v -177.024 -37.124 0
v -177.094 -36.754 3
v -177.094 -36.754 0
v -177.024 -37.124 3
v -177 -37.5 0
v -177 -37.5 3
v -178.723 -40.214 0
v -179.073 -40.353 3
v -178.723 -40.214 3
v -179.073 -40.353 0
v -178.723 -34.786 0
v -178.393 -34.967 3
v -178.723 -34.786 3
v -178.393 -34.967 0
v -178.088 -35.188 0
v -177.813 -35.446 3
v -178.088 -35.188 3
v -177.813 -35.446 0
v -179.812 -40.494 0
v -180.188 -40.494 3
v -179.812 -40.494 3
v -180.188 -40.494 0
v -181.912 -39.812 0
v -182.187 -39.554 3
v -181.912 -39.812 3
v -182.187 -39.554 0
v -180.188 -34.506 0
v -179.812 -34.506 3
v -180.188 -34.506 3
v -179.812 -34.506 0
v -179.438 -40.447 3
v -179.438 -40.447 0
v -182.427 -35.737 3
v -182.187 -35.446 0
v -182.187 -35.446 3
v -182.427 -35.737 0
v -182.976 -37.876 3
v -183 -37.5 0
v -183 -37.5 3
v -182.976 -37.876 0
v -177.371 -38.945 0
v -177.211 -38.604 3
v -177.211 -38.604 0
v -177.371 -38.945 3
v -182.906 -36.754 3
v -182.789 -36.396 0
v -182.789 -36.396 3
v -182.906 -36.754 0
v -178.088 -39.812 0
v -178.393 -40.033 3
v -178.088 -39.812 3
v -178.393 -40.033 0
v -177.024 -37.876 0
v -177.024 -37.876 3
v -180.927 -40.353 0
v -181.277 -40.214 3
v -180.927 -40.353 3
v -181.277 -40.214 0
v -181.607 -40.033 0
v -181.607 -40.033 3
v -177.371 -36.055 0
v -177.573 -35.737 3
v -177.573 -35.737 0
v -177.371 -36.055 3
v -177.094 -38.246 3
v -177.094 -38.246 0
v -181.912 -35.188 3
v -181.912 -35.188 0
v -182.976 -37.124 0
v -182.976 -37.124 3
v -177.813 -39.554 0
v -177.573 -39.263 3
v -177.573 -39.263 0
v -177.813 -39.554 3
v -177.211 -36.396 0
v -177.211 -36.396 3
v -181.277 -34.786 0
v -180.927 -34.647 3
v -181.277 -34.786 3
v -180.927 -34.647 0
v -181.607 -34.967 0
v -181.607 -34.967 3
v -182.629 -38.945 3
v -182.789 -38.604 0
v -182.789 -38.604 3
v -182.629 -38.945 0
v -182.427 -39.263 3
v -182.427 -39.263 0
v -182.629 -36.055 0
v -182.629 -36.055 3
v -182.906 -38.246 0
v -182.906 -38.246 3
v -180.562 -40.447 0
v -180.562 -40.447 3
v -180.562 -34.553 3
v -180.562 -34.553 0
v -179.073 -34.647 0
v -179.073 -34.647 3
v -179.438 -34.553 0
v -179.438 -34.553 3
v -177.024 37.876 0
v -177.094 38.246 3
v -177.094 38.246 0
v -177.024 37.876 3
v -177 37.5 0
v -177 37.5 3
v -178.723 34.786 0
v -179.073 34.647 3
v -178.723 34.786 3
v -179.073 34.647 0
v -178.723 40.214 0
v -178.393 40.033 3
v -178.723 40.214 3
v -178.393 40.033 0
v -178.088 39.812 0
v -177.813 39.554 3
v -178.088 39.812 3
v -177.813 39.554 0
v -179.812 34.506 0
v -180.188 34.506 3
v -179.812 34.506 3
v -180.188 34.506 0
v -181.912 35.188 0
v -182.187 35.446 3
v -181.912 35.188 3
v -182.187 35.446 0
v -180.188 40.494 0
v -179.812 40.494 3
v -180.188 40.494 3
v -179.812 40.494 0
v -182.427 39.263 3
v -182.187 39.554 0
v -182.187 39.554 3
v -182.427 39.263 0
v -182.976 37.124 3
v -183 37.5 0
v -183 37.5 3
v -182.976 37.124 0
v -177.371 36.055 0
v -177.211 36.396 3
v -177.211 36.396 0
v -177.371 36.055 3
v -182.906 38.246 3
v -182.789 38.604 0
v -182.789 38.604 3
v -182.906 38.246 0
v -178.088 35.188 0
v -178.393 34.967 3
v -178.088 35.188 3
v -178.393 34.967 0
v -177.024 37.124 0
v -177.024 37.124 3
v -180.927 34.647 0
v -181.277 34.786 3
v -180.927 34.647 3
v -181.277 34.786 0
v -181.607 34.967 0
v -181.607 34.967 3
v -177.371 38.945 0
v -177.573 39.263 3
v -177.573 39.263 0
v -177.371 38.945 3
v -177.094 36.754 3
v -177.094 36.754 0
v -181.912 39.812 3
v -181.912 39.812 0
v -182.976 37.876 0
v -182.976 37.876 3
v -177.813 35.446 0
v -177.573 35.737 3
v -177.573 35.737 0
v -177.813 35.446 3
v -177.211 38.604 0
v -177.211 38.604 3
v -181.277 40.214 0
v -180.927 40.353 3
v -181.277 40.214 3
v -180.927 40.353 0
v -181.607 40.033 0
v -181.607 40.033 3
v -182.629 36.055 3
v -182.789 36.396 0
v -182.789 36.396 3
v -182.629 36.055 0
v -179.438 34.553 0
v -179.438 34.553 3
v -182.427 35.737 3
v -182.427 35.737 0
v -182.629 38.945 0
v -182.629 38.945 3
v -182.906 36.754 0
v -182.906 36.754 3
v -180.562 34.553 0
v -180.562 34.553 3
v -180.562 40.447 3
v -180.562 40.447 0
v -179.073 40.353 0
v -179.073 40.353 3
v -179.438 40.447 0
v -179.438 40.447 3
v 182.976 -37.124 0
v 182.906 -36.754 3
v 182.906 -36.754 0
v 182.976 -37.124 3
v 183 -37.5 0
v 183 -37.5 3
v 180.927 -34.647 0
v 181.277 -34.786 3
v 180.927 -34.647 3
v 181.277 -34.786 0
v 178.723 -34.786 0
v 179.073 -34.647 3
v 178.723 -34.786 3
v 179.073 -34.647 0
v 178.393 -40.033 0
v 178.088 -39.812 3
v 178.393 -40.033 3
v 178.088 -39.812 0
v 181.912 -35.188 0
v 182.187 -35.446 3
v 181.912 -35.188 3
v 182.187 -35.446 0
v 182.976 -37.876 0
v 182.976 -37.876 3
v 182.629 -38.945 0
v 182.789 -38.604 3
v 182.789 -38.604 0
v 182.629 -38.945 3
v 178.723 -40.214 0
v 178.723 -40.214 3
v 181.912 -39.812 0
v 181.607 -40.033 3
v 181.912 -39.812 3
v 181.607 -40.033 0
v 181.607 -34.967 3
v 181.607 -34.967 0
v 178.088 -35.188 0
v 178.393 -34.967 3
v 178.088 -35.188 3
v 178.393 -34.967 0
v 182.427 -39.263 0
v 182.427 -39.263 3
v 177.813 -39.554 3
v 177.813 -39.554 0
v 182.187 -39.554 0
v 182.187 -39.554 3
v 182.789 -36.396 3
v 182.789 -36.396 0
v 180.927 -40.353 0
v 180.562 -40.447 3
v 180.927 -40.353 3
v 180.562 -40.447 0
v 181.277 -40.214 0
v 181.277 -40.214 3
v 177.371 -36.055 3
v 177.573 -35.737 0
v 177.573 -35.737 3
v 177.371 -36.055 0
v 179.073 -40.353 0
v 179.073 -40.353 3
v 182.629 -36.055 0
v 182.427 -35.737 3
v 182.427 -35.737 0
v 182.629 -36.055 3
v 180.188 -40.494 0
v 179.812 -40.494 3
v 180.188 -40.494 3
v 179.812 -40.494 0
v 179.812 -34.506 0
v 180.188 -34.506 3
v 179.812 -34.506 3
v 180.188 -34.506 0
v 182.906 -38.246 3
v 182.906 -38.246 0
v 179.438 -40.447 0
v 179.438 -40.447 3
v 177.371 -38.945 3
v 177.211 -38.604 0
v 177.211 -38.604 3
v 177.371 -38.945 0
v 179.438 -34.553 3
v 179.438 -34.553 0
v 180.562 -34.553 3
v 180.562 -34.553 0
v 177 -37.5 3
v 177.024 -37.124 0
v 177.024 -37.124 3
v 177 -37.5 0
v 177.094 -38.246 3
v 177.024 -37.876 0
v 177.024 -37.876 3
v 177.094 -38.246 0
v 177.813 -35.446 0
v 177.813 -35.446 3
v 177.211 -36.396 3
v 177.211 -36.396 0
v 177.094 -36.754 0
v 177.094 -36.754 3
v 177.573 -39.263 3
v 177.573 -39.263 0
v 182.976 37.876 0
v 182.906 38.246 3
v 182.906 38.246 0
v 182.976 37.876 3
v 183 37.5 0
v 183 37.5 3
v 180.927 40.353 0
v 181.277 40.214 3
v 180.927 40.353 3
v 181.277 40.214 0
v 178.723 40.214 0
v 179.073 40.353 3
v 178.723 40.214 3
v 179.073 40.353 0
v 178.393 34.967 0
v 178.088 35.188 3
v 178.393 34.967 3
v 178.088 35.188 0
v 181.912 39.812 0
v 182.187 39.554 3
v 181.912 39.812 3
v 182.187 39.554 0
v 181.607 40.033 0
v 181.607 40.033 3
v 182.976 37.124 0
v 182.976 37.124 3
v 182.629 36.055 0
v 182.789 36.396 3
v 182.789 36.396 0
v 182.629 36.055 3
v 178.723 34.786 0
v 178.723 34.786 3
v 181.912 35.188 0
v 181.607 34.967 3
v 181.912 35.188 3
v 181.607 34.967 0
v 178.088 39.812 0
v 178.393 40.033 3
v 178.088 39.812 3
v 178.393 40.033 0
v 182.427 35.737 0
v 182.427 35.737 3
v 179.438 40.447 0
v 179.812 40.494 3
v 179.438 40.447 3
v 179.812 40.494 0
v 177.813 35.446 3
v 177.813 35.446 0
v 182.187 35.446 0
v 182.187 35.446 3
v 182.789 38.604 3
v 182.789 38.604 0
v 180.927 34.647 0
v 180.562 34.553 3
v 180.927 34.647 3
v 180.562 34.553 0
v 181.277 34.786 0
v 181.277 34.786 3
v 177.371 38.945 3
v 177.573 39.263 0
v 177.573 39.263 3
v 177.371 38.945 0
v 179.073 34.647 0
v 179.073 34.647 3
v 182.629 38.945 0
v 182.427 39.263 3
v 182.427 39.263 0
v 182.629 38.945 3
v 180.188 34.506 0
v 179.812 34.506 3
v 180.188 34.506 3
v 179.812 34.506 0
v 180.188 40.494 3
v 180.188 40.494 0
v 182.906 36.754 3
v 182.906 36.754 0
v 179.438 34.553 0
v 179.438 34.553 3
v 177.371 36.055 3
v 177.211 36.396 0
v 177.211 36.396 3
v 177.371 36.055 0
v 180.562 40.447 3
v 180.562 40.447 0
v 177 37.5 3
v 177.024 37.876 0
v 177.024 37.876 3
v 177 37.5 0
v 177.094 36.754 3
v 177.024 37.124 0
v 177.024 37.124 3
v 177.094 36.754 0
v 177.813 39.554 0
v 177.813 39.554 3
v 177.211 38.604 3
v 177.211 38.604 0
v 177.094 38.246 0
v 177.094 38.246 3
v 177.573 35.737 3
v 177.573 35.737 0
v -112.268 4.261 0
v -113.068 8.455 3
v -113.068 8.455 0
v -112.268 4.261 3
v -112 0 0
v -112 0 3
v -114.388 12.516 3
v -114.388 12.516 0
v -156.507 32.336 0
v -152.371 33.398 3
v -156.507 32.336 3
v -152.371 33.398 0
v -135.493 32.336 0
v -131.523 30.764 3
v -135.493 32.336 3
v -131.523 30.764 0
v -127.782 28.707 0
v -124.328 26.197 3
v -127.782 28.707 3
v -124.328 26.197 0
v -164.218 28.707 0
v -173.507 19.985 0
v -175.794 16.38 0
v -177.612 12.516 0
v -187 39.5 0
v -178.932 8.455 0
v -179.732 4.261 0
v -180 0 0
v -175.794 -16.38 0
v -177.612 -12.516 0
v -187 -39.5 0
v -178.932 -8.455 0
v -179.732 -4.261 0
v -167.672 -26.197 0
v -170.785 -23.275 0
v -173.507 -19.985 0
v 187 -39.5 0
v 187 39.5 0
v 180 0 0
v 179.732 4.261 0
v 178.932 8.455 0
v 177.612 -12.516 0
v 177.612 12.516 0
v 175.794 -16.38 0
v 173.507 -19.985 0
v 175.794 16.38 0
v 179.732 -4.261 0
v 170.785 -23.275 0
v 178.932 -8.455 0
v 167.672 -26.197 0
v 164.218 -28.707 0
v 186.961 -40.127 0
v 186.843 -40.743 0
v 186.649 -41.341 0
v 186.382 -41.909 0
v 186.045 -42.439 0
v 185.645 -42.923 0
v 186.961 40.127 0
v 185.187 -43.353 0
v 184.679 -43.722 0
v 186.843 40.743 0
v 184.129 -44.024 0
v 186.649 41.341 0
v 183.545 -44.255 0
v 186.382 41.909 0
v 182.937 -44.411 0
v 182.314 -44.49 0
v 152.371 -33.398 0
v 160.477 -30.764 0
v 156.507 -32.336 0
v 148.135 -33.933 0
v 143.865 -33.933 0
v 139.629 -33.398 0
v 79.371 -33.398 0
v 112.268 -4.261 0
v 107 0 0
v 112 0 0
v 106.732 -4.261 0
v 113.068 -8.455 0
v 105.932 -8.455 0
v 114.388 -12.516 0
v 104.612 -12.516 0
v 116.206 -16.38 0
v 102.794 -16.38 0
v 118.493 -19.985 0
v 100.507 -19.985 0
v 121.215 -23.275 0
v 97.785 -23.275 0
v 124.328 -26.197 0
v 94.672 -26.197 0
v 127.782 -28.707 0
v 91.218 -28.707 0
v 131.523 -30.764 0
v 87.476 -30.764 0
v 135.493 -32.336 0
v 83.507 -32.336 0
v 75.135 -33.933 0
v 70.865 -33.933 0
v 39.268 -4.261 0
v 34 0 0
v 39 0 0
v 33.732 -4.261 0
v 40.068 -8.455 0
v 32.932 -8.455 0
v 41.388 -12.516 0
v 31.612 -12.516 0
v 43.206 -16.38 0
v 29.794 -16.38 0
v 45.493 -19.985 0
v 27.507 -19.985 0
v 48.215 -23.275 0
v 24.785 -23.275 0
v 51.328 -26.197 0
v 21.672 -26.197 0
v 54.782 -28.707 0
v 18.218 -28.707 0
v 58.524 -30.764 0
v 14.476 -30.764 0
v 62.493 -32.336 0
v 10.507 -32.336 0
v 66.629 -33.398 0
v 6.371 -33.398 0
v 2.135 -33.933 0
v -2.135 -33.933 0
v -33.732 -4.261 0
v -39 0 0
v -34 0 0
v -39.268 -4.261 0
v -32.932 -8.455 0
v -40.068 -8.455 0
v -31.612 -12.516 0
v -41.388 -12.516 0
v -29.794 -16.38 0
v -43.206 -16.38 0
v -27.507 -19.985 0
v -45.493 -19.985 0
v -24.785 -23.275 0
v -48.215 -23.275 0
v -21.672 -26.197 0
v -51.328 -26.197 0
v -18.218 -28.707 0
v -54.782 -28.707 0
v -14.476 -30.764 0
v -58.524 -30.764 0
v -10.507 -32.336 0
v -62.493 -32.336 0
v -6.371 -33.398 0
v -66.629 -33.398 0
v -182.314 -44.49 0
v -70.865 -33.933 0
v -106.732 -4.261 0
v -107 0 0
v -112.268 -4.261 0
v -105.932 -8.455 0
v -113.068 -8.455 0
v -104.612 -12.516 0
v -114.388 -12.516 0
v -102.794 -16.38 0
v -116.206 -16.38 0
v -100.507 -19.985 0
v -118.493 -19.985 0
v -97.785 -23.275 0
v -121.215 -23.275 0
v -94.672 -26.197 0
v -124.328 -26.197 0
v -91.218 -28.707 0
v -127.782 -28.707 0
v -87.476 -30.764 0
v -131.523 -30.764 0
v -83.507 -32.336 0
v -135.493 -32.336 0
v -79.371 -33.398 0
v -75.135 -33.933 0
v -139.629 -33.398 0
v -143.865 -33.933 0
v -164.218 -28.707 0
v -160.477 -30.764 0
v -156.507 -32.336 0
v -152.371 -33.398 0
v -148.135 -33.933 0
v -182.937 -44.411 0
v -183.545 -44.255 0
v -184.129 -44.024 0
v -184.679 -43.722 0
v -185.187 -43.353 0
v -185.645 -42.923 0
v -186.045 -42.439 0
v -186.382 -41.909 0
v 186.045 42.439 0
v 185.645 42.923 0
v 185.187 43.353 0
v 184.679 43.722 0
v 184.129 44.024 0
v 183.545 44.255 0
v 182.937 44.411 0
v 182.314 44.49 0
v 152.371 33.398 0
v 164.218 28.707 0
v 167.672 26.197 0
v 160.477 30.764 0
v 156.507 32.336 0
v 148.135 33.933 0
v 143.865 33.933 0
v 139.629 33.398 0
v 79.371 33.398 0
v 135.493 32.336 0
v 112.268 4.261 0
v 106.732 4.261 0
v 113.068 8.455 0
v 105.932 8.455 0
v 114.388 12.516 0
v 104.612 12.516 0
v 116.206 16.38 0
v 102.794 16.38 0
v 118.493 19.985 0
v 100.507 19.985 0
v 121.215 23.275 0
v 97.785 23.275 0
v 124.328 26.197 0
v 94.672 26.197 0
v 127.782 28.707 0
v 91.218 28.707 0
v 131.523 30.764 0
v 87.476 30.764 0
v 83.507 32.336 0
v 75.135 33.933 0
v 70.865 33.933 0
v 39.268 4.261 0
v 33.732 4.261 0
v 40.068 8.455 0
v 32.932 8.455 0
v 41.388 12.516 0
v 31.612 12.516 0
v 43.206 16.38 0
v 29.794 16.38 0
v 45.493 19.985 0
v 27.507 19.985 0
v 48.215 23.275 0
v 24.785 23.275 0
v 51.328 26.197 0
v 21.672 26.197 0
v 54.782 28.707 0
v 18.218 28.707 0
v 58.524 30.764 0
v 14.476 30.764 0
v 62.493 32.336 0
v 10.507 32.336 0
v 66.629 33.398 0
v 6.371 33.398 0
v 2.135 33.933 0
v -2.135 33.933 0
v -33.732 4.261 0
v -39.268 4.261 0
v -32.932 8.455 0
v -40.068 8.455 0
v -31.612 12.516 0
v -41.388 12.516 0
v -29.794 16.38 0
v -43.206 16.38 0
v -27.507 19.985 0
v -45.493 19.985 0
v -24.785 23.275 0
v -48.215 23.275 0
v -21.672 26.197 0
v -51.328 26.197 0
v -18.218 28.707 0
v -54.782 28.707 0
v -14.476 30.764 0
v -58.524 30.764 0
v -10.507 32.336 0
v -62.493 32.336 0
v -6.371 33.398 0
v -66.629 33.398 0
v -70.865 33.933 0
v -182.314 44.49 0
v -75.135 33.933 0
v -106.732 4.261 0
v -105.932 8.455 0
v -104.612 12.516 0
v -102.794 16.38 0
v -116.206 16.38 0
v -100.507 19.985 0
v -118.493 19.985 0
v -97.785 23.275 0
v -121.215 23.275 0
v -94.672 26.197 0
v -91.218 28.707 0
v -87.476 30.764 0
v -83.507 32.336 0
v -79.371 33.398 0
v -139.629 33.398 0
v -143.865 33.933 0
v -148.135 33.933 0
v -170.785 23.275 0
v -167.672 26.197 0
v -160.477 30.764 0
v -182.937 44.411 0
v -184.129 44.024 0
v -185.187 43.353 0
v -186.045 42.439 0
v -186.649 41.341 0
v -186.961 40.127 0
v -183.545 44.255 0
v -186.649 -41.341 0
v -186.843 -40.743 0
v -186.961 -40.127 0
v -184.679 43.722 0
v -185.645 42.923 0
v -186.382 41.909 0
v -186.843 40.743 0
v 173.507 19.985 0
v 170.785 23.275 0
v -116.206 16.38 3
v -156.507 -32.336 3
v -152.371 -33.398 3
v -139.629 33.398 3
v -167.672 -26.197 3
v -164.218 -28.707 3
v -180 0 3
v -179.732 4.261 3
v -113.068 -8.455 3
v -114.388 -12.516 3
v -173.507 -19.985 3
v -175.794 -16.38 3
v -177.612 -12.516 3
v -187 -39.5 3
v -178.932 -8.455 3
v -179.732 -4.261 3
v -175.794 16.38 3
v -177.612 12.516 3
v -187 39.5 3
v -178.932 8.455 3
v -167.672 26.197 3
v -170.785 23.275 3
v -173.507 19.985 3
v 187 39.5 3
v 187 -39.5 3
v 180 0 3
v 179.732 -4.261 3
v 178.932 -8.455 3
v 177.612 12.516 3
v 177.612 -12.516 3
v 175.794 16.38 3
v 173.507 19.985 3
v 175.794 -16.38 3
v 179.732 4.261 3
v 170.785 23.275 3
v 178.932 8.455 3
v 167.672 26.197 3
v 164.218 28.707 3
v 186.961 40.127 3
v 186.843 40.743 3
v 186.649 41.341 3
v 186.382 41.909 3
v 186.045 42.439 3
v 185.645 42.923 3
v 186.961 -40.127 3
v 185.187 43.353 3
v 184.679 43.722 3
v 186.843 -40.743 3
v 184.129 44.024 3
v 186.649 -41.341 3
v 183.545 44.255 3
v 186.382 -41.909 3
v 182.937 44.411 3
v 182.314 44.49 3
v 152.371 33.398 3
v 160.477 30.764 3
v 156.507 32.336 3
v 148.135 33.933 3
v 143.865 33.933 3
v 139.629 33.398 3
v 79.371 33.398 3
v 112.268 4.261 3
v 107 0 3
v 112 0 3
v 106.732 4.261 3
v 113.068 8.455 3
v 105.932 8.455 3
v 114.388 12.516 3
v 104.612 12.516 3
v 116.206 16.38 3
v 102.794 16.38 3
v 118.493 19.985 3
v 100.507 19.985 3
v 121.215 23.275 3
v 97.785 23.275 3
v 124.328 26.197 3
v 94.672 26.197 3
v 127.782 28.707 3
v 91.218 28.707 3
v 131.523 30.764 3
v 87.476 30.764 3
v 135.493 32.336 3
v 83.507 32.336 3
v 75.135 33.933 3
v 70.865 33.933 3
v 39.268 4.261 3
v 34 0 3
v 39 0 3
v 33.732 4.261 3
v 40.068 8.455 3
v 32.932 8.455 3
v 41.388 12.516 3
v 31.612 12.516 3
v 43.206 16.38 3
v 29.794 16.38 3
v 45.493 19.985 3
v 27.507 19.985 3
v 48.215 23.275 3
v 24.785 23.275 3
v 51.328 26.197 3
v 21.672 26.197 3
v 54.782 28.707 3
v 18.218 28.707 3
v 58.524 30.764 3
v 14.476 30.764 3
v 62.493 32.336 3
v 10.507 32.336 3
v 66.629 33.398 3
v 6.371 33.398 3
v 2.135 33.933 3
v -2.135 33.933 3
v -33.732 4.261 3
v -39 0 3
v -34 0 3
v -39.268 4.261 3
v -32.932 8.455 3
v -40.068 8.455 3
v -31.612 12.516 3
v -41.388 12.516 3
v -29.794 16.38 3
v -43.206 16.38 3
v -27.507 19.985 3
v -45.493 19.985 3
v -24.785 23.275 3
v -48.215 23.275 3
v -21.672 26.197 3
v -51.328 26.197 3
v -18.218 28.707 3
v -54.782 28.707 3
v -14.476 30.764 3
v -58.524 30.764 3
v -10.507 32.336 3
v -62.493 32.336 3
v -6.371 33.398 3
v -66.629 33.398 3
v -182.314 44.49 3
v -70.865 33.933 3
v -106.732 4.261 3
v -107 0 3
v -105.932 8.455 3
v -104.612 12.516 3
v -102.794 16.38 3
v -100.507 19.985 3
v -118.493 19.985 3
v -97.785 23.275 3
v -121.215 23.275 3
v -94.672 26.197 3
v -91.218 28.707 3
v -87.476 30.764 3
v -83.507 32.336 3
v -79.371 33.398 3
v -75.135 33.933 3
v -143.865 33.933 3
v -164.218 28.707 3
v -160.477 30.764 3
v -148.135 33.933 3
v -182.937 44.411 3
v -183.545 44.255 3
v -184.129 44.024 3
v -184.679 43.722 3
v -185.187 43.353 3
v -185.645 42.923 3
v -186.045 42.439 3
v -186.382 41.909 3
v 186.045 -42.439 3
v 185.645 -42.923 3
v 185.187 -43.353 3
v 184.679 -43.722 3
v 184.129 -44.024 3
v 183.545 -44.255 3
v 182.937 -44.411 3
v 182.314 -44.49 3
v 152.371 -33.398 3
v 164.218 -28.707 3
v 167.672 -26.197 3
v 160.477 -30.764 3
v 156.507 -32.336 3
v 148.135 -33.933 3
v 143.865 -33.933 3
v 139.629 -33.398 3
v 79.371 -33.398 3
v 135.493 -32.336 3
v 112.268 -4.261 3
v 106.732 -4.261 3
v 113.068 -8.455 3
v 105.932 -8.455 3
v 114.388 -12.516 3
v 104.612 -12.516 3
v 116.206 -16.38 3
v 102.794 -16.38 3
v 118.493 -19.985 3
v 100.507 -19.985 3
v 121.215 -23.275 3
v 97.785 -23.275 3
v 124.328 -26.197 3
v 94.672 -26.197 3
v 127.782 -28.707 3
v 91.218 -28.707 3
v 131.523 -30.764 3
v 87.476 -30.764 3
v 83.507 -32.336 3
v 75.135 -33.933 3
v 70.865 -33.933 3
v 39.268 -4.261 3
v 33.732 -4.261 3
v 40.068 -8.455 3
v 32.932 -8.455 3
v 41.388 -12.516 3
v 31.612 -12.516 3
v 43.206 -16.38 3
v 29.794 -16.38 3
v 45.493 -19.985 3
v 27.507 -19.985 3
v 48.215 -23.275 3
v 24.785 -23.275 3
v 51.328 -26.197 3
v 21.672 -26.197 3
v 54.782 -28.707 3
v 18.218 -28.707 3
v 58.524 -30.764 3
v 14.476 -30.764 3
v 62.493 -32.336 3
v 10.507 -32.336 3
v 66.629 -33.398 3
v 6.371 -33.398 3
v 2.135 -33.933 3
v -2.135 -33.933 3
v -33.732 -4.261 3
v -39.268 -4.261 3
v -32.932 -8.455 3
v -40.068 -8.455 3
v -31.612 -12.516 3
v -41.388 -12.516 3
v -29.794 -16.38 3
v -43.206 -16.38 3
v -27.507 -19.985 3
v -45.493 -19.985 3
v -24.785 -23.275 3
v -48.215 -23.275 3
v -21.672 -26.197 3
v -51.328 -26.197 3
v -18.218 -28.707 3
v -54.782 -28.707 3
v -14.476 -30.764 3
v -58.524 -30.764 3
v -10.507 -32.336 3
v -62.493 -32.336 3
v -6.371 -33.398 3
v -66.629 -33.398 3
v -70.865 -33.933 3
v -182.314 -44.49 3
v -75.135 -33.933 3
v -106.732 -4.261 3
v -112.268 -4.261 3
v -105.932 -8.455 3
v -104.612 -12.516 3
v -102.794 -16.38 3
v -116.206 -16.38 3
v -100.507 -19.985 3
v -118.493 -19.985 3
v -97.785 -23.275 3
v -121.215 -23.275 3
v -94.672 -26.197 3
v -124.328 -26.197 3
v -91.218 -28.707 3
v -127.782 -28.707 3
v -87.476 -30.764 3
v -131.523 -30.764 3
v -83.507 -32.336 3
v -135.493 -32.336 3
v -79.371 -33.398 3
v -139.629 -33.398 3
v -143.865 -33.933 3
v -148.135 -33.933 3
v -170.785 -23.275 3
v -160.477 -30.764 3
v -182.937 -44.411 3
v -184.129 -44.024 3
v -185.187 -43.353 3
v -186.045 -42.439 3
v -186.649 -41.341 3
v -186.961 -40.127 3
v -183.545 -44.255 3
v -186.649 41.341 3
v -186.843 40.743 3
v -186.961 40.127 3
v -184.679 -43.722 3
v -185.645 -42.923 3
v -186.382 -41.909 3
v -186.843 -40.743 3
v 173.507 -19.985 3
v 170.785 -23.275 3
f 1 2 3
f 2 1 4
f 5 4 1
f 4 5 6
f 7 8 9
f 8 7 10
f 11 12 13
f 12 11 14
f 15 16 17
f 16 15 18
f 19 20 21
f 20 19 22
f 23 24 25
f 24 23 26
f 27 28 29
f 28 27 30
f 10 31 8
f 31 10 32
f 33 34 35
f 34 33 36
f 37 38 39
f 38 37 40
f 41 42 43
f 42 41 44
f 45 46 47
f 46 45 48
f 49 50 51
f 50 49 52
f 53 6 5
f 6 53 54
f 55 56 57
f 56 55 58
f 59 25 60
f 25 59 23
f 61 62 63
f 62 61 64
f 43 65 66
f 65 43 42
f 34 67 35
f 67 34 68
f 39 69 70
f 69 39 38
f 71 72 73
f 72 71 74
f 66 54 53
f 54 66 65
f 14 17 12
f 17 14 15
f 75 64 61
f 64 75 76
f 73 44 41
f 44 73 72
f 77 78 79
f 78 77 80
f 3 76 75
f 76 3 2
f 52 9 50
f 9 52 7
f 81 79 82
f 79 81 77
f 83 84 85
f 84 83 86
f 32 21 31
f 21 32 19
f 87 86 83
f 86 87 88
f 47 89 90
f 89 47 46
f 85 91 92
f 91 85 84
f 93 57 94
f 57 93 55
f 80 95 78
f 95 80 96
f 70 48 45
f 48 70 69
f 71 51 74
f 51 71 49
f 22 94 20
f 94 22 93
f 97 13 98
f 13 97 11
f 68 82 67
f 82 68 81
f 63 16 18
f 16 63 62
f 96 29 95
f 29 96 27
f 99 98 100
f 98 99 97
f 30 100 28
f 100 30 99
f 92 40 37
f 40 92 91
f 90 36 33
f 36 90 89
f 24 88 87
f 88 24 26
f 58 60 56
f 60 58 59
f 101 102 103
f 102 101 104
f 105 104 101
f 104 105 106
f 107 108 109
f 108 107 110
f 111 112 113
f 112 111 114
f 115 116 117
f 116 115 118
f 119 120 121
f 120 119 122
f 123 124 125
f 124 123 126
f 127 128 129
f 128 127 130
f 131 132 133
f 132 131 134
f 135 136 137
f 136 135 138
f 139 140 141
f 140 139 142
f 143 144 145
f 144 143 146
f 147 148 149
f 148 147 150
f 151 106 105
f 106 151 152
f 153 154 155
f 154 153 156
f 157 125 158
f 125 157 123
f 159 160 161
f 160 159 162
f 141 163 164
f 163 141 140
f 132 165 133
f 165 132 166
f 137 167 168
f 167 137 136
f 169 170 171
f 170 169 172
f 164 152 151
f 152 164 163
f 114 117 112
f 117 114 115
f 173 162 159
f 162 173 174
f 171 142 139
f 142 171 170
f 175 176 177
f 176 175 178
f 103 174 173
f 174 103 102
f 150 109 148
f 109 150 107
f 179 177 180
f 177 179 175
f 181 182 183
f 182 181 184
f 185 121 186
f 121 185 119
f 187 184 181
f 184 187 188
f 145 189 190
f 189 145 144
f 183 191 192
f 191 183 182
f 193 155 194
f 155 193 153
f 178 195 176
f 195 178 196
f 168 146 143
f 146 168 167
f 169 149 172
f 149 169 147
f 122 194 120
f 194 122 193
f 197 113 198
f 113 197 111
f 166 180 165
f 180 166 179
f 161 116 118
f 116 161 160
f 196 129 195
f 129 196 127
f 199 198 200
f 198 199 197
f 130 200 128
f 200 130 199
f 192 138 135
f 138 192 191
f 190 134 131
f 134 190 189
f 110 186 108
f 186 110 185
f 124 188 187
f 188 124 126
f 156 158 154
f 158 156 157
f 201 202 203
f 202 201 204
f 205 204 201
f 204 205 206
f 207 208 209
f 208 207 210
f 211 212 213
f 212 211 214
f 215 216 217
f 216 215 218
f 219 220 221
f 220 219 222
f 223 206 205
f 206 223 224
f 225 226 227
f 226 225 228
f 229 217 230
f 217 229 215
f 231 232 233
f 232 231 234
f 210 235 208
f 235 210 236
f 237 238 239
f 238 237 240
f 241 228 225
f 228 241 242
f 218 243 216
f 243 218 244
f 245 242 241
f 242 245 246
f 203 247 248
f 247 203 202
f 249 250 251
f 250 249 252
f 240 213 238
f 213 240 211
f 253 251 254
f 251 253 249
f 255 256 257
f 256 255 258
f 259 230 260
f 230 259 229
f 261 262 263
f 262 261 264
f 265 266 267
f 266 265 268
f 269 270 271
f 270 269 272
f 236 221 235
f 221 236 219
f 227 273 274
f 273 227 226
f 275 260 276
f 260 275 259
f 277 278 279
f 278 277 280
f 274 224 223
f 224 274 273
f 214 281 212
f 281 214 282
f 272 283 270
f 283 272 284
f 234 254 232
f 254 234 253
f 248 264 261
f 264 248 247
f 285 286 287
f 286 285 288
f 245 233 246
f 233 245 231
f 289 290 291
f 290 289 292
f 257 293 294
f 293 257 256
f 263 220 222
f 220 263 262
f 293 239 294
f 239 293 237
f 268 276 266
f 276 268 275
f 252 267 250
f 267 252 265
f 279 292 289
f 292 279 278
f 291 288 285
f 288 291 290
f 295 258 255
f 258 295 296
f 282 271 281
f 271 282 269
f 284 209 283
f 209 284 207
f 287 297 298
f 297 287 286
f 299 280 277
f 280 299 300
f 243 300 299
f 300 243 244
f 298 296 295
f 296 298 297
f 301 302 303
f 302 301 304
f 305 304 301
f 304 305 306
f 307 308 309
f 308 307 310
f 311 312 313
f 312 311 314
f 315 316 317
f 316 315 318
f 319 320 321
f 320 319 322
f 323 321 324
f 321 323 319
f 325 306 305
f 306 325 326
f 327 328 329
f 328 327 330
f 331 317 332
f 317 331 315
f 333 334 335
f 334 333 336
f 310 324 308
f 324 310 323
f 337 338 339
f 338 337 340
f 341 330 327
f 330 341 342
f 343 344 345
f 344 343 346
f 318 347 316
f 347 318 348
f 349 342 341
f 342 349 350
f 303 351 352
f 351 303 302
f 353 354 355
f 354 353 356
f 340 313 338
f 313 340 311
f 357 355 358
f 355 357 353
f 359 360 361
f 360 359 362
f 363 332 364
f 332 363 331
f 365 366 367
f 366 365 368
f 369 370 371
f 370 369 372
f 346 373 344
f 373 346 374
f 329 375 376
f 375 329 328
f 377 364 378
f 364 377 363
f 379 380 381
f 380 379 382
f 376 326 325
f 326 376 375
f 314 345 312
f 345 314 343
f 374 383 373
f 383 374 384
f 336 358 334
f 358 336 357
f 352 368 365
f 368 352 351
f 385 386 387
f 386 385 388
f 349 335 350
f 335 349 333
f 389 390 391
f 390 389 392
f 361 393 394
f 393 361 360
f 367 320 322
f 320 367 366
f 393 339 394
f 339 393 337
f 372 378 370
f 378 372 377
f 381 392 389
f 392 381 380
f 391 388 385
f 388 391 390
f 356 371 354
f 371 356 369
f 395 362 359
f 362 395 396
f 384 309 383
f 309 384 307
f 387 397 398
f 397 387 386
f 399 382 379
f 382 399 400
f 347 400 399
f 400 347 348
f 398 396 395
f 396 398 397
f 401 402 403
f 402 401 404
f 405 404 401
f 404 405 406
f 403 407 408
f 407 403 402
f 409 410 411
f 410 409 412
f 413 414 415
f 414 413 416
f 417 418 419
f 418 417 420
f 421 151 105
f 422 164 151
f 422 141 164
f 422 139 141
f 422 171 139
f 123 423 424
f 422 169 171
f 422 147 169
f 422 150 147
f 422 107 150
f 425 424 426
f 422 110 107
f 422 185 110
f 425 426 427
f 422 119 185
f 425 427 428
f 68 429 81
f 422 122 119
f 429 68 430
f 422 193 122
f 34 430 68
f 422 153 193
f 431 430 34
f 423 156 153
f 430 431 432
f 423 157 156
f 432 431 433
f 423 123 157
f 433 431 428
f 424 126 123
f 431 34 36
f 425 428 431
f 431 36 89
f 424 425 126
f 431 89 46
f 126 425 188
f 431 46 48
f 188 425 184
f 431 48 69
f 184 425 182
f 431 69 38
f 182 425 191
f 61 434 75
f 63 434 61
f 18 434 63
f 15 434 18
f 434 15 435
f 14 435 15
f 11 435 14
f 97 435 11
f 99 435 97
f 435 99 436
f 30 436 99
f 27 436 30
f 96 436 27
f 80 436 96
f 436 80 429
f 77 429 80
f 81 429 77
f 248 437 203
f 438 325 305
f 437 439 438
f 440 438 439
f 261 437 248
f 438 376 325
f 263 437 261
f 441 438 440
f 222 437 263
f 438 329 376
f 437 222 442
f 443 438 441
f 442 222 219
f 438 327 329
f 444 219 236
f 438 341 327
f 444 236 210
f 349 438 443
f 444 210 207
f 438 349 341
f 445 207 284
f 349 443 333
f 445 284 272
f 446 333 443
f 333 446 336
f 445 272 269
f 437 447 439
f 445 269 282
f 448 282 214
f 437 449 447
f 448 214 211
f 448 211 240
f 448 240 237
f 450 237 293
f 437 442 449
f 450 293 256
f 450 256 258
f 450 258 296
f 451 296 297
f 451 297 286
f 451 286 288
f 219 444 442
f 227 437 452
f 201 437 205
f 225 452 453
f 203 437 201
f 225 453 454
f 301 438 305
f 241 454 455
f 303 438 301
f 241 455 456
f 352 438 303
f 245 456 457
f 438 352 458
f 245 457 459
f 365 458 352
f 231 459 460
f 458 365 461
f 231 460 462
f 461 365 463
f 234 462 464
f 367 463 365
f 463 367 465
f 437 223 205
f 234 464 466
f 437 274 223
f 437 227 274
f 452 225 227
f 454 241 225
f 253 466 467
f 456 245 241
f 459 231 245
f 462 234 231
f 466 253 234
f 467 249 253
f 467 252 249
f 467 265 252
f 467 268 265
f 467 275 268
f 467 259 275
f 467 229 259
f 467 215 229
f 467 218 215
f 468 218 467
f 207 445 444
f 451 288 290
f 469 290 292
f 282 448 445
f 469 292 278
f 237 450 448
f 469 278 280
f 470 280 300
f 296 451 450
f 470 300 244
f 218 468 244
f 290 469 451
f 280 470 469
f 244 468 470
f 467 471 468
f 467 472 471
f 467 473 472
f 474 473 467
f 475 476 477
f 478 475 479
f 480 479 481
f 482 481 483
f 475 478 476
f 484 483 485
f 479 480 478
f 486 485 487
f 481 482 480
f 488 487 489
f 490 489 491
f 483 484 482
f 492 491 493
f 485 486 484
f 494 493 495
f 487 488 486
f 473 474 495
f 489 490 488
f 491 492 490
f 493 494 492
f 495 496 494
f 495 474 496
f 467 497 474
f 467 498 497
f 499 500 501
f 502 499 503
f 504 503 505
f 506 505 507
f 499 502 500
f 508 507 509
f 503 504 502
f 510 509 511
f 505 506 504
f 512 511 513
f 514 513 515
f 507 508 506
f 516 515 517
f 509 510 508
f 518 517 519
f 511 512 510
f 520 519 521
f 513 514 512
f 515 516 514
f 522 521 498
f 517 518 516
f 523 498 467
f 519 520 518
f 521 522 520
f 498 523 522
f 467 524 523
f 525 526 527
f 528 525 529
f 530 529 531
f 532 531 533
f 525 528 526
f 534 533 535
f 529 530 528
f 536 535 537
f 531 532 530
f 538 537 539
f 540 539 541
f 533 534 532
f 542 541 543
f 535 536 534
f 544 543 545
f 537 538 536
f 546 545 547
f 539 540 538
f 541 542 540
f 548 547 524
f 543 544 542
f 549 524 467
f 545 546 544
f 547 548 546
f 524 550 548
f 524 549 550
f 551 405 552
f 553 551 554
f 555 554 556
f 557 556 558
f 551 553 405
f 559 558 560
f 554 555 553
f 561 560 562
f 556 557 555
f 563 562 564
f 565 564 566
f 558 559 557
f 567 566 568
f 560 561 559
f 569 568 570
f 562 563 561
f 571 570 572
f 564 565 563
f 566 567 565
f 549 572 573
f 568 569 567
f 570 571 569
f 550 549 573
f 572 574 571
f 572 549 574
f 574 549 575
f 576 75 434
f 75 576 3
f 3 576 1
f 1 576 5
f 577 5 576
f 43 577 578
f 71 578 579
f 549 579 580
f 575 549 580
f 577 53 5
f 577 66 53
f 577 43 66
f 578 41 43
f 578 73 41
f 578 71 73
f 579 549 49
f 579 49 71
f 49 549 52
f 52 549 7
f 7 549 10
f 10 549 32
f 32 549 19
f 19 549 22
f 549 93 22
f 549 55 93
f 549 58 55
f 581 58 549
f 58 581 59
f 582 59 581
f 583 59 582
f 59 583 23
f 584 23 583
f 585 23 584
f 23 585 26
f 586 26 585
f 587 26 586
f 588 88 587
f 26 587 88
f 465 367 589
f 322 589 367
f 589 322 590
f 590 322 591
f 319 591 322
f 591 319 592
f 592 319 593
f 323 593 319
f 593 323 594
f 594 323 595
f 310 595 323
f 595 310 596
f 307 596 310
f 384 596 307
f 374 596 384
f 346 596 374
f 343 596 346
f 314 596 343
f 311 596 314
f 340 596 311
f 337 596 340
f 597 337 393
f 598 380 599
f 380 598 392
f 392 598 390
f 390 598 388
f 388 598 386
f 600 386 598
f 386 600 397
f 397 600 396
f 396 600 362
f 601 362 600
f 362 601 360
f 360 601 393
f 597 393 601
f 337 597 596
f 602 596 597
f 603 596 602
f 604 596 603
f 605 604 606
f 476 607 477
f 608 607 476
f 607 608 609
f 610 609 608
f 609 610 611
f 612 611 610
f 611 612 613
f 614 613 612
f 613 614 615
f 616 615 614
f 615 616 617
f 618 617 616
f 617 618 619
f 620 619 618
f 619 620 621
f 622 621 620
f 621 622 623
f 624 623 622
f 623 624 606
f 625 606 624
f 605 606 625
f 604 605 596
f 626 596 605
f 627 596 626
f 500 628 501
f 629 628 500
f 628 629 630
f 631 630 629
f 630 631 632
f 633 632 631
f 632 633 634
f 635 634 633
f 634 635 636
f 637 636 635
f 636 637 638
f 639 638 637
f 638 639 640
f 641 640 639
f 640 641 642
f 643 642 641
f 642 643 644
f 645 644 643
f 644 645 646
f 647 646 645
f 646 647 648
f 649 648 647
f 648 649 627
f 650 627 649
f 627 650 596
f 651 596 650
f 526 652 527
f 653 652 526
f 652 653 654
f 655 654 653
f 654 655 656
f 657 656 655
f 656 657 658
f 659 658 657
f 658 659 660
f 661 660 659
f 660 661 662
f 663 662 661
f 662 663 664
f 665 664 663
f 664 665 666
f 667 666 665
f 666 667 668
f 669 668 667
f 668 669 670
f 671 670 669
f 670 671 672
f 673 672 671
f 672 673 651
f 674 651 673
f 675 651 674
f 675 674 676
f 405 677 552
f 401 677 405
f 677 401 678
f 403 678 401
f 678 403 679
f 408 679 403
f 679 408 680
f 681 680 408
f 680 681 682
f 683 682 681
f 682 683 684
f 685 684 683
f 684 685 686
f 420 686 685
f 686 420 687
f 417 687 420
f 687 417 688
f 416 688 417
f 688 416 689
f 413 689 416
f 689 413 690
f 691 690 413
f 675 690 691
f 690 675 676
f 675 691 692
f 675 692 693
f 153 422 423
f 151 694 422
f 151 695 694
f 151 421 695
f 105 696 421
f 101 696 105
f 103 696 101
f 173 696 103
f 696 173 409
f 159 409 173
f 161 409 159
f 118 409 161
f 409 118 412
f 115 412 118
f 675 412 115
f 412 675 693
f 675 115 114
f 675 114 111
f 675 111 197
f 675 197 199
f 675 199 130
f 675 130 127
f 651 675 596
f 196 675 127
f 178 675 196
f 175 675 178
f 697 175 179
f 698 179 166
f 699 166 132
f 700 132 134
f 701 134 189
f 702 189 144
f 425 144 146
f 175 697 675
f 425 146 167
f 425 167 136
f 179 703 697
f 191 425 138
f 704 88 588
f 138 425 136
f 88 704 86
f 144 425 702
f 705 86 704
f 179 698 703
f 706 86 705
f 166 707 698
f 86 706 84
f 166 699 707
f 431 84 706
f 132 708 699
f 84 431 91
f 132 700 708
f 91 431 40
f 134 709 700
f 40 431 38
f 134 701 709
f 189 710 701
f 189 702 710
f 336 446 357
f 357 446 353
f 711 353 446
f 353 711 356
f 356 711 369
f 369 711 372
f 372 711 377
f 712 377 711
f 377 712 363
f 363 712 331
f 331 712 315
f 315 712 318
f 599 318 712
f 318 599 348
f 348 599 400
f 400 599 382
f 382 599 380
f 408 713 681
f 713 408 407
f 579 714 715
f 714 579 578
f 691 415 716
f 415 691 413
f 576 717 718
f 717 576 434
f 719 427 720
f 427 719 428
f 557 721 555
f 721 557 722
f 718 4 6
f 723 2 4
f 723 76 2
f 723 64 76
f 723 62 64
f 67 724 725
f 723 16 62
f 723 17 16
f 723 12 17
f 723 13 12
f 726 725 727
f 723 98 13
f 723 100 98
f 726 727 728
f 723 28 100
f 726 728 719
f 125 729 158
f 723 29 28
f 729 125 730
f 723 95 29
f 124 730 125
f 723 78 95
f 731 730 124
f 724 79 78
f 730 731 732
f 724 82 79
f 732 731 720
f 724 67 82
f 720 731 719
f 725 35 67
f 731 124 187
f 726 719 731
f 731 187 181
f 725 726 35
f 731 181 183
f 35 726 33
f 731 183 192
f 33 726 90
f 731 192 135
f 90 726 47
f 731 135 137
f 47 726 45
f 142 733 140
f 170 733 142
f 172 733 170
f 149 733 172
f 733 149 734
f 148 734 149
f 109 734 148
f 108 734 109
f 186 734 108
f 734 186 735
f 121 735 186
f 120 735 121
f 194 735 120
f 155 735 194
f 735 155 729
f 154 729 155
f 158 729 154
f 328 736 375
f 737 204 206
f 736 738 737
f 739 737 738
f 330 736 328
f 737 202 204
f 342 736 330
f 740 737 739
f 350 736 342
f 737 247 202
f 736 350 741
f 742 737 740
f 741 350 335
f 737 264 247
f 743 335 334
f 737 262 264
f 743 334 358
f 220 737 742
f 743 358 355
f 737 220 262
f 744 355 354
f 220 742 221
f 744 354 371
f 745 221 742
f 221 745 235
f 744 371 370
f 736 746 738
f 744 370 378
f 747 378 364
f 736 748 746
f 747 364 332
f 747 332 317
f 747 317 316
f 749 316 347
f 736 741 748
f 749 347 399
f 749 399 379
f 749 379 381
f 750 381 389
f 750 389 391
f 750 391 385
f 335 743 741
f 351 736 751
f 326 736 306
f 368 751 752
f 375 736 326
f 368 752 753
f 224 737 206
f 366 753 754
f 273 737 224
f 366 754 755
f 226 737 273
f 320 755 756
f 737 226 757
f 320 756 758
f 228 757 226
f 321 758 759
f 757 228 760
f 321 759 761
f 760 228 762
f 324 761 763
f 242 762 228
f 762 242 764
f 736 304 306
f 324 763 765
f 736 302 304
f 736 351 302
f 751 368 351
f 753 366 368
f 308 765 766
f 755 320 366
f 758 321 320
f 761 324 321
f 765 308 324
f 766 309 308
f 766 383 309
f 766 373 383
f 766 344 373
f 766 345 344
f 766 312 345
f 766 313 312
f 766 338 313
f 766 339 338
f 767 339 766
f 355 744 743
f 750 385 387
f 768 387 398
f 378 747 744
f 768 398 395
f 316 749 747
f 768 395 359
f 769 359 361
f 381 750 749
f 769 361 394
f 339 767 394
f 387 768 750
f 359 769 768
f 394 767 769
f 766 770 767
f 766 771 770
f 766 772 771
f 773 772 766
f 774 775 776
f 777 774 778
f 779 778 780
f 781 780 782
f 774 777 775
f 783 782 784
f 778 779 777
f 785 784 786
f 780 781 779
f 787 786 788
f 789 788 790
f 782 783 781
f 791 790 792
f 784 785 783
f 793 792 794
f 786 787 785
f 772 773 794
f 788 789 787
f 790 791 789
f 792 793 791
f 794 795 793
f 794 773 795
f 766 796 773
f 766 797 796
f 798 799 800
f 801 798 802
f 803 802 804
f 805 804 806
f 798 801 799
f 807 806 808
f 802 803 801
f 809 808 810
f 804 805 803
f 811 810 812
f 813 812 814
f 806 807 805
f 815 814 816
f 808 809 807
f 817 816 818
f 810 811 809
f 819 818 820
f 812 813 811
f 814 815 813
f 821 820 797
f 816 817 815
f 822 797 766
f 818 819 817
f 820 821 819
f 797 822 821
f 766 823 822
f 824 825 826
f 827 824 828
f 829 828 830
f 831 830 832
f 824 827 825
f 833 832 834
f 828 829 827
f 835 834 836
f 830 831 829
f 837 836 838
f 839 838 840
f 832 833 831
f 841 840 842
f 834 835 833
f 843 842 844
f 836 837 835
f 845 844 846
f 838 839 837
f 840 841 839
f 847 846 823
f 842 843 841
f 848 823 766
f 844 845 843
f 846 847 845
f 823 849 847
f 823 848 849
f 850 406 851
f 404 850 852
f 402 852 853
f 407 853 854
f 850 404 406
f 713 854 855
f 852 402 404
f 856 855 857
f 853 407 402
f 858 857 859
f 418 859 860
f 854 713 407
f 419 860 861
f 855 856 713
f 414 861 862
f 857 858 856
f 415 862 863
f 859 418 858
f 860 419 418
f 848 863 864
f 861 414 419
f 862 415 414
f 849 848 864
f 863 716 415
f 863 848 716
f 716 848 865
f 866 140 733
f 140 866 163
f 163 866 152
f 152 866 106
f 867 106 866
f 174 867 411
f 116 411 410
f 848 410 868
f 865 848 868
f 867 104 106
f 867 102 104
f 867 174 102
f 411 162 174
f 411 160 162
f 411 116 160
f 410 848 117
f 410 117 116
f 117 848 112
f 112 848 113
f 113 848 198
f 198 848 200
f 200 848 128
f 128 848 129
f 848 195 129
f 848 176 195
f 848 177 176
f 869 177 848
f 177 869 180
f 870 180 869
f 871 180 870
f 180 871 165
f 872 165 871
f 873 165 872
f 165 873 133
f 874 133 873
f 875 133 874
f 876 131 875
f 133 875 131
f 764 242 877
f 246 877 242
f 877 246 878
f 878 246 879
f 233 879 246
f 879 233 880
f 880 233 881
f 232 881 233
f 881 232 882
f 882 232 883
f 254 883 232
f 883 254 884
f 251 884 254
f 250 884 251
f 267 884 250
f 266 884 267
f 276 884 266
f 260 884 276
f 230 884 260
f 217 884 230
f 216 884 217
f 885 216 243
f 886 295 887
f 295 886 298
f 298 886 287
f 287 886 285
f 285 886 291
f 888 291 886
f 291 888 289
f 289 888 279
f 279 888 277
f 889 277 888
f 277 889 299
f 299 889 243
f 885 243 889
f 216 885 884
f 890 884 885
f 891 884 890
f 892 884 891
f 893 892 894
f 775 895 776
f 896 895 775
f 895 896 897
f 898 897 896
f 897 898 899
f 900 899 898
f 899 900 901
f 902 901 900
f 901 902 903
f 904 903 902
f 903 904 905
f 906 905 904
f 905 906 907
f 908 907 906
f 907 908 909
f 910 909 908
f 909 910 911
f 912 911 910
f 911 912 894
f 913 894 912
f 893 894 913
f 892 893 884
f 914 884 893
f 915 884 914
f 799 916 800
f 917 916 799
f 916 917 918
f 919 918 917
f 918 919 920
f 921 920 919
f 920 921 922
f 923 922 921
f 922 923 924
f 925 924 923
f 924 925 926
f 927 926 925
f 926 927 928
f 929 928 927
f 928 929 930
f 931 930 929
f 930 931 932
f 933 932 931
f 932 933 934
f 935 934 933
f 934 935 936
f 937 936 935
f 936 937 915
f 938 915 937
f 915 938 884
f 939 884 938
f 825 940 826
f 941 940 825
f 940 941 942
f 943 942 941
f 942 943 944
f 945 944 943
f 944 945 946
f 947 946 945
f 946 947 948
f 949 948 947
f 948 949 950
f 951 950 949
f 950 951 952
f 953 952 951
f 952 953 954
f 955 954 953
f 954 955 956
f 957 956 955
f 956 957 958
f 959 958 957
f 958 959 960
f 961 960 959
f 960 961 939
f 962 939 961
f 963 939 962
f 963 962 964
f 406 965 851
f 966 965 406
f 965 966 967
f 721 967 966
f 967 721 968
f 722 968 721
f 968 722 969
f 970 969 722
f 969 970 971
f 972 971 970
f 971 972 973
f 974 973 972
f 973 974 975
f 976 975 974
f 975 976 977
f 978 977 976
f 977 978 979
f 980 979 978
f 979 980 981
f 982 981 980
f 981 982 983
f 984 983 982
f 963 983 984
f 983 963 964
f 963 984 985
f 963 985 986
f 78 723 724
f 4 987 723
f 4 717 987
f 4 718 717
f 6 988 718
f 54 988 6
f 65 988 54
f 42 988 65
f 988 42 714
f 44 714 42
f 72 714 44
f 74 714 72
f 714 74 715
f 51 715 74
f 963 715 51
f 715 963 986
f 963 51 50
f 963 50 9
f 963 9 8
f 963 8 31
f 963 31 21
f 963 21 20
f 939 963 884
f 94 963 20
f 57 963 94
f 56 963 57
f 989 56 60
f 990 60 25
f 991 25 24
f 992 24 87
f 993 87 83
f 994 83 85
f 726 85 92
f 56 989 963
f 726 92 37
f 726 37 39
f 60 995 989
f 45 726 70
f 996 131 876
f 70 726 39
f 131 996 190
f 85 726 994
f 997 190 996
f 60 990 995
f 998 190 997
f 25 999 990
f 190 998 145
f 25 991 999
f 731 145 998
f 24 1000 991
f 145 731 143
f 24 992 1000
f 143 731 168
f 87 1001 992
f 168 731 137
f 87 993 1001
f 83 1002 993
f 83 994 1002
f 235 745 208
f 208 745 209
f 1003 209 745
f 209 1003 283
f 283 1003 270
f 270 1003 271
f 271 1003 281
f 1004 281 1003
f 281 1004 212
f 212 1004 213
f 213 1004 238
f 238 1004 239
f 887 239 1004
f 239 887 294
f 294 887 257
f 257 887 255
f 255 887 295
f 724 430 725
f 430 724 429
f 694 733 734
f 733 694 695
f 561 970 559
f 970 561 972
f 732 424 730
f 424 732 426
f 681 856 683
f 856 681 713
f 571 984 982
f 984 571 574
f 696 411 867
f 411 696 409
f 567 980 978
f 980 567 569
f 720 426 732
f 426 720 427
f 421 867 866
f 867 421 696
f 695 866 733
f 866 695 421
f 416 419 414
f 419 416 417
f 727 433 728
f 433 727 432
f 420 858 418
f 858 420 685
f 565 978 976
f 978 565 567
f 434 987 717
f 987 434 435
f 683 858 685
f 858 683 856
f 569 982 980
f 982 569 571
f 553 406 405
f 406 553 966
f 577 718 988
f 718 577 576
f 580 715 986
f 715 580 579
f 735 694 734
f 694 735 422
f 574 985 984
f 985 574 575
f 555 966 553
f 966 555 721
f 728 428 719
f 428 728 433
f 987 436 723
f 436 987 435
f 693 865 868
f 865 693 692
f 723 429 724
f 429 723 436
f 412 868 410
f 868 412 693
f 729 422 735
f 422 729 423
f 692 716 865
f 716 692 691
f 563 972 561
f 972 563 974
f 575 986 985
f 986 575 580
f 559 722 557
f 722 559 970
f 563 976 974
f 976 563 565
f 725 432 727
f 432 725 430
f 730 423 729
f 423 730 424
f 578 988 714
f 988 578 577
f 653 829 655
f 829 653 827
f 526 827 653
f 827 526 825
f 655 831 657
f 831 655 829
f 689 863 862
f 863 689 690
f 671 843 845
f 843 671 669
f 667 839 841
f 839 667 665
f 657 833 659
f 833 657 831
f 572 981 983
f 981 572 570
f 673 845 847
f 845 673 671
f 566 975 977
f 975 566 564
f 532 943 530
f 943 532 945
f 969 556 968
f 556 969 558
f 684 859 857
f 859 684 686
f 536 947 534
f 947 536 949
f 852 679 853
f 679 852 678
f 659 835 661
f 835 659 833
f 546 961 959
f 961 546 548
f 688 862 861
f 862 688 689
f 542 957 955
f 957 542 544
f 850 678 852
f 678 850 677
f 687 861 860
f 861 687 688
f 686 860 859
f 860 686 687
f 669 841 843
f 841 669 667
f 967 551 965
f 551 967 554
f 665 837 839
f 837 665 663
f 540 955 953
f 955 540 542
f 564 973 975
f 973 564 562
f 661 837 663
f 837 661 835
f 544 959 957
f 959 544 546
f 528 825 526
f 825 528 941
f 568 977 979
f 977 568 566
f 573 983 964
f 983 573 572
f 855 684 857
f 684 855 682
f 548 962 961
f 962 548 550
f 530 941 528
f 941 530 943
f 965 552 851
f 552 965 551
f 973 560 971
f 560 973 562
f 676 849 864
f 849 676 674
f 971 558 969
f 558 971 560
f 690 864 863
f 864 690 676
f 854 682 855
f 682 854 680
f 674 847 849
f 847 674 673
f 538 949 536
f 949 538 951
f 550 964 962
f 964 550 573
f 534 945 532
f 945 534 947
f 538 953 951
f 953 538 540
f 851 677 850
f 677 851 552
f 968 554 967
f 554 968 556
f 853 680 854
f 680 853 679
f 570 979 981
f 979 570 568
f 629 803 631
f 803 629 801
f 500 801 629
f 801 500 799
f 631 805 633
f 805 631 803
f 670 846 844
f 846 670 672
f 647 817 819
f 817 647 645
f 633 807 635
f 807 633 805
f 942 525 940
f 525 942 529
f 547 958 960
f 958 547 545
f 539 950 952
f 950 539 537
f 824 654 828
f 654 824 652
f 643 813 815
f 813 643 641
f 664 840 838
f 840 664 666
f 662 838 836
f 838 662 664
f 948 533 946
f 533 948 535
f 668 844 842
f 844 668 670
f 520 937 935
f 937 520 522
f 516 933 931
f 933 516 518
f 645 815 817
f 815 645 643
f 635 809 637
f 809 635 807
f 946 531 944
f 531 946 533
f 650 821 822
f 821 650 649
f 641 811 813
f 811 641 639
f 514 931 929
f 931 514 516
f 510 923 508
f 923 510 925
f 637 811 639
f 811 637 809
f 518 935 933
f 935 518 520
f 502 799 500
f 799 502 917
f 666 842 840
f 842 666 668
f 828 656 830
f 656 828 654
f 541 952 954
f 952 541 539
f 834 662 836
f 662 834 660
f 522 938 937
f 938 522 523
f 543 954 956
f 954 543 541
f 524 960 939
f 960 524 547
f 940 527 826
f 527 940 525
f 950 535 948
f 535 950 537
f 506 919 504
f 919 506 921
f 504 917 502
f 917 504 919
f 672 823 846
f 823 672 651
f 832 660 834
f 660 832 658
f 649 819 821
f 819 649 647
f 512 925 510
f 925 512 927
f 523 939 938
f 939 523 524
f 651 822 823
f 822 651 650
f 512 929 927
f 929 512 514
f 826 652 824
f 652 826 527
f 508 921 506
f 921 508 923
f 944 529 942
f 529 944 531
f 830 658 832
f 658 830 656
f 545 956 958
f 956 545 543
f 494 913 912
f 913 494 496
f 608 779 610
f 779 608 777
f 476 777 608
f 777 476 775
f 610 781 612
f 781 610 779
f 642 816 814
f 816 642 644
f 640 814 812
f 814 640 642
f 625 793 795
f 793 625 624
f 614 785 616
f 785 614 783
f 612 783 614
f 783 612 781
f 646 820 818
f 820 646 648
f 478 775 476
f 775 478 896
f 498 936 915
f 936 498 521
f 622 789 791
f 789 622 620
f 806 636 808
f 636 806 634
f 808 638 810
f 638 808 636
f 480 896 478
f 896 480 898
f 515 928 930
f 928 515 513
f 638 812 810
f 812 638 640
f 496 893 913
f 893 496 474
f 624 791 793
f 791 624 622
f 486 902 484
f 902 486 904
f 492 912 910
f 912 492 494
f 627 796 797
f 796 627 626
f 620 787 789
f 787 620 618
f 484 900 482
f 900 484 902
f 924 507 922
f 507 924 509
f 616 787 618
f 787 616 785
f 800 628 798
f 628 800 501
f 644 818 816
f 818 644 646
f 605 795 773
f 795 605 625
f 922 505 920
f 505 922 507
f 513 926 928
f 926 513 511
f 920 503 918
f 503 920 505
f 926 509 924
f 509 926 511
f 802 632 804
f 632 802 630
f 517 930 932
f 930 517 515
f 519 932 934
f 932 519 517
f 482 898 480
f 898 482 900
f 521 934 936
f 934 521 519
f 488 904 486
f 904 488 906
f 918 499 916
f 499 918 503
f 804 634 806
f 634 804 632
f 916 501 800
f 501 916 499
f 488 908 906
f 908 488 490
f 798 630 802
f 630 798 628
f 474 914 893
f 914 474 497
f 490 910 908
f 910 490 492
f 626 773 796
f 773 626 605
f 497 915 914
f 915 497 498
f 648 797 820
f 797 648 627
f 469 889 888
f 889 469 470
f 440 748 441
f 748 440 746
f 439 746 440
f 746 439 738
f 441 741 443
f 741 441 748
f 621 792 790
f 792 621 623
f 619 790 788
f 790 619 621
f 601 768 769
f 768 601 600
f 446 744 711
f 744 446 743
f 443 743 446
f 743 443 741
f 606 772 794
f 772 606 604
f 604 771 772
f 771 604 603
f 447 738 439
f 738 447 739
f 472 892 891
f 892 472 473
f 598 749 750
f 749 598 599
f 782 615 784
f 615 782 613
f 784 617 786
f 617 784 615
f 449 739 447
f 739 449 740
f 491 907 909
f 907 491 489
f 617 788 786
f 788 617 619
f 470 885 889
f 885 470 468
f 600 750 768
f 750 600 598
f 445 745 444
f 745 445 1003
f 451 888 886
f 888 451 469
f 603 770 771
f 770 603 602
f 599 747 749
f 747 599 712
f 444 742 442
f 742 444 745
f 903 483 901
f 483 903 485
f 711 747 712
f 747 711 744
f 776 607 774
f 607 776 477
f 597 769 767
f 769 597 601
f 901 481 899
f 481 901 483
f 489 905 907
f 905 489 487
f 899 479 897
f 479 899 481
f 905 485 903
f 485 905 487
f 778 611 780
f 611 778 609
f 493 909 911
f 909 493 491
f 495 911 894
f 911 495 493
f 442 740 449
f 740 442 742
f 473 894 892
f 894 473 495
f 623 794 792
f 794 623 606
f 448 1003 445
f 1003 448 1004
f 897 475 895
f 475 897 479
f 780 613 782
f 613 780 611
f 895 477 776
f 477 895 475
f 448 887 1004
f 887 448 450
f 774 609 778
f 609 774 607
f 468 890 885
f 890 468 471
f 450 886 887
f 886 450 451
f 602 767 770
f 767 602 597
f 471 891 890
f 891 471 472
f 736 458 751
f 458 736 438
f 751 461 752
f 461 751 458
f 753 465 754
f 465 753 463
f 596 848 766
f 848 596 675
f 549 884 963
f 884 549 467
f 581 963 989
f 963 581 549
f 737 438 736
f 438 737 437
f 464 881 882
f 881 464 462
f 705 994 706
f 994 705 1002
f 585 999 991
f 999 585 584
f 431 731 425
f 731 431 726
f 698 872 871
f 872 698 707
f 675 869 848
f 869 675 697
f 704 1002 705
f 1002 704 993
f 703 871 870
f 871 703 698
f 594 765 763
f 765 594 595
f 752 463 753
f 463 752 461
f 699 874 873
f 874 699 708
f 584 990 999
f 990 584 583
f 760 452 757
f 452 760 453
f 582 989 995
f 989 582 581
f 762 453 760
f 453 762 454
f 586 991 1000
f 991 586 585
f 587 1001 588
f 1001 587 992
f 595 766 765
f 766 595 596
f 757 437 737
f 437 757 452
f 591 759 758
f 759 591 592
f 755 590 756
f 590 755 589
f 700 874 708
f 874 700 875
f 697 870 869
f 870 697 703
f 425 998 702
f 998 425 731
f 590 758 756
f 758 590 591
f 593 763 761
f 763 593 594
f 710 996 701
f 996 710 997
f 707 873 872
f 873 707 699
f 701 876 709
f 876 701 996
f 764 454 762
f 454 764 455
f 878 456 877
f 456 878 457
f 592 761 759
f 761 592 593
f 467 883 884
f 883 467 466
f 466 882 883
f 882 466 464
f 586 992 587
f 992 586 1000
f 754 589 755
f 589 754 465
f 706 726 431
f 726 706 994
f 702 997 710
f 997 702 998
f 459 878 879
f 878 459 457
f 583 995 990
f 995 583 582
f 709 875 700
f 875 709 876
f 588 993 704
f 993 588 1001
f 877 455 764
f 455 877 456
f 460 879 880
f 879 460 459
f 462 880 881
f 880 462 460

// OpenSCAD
$fn = 50;


difference() {
	union() {
		hull() {
			translate(v = [-182.0000000000, 39.5000000000, 0]) {
				cylinder(h = 3, r = 5);
			}
			translate(v = [182.0000000000, 39.5000000000, 0]) {
				cylinder(h = 3, r = 5);
			}
			translate(v = [-182.0000000000, -39.5000000000, 0]) {
				cylinder(h = 3, r = 5);
			}
			translate(v = [182.0000000000, -39.5000000000, 0]) {
				cylinder(h = 3, r = 5);
			}
		}
	}
	union() {
		#translate(v = [-180.0000000000, -37.5000000000, -100.0000000000]) {
			cylinder(h = 200, r = 3.0000000000);
		}
		#translate(v = [-180.0000000000, 37.5000000000, -100.0000000000]) {
			cylinder(h = 200, r = 3.0000000000);
		}
		#translate(v = [180.0000000000, -37.5000000000, -100.0000000000]) {
			cylinder(h = 200, r = 3.0000000000);
		}
		#translate(v = [180.0000000000, 37.5000000000, -100.0000000000]) {
			cylinder(h = 200, r = 3.0000000000);
		}
		#translate(v = [-146.0000000000, 0, 0]) {
			cylinder(h = 3, r = 34.0000000000);
		}
		#translate(v = [-73.0000000000, 0, 0]) {
			cylinder(h = 3, r = 34.0000000000);
		}
		#cylinder(h = 3, r = 34.0000000000);
		#translate(v = [73.0000000000, 0, 0]) {
			cylinder(h = 3, r = 34.0000000000);
		}
		#translate(v = [146.0000000000, 0, 0]) {
			cylinder(h = 3, r = 34.0000000000);
		}
	}
}
